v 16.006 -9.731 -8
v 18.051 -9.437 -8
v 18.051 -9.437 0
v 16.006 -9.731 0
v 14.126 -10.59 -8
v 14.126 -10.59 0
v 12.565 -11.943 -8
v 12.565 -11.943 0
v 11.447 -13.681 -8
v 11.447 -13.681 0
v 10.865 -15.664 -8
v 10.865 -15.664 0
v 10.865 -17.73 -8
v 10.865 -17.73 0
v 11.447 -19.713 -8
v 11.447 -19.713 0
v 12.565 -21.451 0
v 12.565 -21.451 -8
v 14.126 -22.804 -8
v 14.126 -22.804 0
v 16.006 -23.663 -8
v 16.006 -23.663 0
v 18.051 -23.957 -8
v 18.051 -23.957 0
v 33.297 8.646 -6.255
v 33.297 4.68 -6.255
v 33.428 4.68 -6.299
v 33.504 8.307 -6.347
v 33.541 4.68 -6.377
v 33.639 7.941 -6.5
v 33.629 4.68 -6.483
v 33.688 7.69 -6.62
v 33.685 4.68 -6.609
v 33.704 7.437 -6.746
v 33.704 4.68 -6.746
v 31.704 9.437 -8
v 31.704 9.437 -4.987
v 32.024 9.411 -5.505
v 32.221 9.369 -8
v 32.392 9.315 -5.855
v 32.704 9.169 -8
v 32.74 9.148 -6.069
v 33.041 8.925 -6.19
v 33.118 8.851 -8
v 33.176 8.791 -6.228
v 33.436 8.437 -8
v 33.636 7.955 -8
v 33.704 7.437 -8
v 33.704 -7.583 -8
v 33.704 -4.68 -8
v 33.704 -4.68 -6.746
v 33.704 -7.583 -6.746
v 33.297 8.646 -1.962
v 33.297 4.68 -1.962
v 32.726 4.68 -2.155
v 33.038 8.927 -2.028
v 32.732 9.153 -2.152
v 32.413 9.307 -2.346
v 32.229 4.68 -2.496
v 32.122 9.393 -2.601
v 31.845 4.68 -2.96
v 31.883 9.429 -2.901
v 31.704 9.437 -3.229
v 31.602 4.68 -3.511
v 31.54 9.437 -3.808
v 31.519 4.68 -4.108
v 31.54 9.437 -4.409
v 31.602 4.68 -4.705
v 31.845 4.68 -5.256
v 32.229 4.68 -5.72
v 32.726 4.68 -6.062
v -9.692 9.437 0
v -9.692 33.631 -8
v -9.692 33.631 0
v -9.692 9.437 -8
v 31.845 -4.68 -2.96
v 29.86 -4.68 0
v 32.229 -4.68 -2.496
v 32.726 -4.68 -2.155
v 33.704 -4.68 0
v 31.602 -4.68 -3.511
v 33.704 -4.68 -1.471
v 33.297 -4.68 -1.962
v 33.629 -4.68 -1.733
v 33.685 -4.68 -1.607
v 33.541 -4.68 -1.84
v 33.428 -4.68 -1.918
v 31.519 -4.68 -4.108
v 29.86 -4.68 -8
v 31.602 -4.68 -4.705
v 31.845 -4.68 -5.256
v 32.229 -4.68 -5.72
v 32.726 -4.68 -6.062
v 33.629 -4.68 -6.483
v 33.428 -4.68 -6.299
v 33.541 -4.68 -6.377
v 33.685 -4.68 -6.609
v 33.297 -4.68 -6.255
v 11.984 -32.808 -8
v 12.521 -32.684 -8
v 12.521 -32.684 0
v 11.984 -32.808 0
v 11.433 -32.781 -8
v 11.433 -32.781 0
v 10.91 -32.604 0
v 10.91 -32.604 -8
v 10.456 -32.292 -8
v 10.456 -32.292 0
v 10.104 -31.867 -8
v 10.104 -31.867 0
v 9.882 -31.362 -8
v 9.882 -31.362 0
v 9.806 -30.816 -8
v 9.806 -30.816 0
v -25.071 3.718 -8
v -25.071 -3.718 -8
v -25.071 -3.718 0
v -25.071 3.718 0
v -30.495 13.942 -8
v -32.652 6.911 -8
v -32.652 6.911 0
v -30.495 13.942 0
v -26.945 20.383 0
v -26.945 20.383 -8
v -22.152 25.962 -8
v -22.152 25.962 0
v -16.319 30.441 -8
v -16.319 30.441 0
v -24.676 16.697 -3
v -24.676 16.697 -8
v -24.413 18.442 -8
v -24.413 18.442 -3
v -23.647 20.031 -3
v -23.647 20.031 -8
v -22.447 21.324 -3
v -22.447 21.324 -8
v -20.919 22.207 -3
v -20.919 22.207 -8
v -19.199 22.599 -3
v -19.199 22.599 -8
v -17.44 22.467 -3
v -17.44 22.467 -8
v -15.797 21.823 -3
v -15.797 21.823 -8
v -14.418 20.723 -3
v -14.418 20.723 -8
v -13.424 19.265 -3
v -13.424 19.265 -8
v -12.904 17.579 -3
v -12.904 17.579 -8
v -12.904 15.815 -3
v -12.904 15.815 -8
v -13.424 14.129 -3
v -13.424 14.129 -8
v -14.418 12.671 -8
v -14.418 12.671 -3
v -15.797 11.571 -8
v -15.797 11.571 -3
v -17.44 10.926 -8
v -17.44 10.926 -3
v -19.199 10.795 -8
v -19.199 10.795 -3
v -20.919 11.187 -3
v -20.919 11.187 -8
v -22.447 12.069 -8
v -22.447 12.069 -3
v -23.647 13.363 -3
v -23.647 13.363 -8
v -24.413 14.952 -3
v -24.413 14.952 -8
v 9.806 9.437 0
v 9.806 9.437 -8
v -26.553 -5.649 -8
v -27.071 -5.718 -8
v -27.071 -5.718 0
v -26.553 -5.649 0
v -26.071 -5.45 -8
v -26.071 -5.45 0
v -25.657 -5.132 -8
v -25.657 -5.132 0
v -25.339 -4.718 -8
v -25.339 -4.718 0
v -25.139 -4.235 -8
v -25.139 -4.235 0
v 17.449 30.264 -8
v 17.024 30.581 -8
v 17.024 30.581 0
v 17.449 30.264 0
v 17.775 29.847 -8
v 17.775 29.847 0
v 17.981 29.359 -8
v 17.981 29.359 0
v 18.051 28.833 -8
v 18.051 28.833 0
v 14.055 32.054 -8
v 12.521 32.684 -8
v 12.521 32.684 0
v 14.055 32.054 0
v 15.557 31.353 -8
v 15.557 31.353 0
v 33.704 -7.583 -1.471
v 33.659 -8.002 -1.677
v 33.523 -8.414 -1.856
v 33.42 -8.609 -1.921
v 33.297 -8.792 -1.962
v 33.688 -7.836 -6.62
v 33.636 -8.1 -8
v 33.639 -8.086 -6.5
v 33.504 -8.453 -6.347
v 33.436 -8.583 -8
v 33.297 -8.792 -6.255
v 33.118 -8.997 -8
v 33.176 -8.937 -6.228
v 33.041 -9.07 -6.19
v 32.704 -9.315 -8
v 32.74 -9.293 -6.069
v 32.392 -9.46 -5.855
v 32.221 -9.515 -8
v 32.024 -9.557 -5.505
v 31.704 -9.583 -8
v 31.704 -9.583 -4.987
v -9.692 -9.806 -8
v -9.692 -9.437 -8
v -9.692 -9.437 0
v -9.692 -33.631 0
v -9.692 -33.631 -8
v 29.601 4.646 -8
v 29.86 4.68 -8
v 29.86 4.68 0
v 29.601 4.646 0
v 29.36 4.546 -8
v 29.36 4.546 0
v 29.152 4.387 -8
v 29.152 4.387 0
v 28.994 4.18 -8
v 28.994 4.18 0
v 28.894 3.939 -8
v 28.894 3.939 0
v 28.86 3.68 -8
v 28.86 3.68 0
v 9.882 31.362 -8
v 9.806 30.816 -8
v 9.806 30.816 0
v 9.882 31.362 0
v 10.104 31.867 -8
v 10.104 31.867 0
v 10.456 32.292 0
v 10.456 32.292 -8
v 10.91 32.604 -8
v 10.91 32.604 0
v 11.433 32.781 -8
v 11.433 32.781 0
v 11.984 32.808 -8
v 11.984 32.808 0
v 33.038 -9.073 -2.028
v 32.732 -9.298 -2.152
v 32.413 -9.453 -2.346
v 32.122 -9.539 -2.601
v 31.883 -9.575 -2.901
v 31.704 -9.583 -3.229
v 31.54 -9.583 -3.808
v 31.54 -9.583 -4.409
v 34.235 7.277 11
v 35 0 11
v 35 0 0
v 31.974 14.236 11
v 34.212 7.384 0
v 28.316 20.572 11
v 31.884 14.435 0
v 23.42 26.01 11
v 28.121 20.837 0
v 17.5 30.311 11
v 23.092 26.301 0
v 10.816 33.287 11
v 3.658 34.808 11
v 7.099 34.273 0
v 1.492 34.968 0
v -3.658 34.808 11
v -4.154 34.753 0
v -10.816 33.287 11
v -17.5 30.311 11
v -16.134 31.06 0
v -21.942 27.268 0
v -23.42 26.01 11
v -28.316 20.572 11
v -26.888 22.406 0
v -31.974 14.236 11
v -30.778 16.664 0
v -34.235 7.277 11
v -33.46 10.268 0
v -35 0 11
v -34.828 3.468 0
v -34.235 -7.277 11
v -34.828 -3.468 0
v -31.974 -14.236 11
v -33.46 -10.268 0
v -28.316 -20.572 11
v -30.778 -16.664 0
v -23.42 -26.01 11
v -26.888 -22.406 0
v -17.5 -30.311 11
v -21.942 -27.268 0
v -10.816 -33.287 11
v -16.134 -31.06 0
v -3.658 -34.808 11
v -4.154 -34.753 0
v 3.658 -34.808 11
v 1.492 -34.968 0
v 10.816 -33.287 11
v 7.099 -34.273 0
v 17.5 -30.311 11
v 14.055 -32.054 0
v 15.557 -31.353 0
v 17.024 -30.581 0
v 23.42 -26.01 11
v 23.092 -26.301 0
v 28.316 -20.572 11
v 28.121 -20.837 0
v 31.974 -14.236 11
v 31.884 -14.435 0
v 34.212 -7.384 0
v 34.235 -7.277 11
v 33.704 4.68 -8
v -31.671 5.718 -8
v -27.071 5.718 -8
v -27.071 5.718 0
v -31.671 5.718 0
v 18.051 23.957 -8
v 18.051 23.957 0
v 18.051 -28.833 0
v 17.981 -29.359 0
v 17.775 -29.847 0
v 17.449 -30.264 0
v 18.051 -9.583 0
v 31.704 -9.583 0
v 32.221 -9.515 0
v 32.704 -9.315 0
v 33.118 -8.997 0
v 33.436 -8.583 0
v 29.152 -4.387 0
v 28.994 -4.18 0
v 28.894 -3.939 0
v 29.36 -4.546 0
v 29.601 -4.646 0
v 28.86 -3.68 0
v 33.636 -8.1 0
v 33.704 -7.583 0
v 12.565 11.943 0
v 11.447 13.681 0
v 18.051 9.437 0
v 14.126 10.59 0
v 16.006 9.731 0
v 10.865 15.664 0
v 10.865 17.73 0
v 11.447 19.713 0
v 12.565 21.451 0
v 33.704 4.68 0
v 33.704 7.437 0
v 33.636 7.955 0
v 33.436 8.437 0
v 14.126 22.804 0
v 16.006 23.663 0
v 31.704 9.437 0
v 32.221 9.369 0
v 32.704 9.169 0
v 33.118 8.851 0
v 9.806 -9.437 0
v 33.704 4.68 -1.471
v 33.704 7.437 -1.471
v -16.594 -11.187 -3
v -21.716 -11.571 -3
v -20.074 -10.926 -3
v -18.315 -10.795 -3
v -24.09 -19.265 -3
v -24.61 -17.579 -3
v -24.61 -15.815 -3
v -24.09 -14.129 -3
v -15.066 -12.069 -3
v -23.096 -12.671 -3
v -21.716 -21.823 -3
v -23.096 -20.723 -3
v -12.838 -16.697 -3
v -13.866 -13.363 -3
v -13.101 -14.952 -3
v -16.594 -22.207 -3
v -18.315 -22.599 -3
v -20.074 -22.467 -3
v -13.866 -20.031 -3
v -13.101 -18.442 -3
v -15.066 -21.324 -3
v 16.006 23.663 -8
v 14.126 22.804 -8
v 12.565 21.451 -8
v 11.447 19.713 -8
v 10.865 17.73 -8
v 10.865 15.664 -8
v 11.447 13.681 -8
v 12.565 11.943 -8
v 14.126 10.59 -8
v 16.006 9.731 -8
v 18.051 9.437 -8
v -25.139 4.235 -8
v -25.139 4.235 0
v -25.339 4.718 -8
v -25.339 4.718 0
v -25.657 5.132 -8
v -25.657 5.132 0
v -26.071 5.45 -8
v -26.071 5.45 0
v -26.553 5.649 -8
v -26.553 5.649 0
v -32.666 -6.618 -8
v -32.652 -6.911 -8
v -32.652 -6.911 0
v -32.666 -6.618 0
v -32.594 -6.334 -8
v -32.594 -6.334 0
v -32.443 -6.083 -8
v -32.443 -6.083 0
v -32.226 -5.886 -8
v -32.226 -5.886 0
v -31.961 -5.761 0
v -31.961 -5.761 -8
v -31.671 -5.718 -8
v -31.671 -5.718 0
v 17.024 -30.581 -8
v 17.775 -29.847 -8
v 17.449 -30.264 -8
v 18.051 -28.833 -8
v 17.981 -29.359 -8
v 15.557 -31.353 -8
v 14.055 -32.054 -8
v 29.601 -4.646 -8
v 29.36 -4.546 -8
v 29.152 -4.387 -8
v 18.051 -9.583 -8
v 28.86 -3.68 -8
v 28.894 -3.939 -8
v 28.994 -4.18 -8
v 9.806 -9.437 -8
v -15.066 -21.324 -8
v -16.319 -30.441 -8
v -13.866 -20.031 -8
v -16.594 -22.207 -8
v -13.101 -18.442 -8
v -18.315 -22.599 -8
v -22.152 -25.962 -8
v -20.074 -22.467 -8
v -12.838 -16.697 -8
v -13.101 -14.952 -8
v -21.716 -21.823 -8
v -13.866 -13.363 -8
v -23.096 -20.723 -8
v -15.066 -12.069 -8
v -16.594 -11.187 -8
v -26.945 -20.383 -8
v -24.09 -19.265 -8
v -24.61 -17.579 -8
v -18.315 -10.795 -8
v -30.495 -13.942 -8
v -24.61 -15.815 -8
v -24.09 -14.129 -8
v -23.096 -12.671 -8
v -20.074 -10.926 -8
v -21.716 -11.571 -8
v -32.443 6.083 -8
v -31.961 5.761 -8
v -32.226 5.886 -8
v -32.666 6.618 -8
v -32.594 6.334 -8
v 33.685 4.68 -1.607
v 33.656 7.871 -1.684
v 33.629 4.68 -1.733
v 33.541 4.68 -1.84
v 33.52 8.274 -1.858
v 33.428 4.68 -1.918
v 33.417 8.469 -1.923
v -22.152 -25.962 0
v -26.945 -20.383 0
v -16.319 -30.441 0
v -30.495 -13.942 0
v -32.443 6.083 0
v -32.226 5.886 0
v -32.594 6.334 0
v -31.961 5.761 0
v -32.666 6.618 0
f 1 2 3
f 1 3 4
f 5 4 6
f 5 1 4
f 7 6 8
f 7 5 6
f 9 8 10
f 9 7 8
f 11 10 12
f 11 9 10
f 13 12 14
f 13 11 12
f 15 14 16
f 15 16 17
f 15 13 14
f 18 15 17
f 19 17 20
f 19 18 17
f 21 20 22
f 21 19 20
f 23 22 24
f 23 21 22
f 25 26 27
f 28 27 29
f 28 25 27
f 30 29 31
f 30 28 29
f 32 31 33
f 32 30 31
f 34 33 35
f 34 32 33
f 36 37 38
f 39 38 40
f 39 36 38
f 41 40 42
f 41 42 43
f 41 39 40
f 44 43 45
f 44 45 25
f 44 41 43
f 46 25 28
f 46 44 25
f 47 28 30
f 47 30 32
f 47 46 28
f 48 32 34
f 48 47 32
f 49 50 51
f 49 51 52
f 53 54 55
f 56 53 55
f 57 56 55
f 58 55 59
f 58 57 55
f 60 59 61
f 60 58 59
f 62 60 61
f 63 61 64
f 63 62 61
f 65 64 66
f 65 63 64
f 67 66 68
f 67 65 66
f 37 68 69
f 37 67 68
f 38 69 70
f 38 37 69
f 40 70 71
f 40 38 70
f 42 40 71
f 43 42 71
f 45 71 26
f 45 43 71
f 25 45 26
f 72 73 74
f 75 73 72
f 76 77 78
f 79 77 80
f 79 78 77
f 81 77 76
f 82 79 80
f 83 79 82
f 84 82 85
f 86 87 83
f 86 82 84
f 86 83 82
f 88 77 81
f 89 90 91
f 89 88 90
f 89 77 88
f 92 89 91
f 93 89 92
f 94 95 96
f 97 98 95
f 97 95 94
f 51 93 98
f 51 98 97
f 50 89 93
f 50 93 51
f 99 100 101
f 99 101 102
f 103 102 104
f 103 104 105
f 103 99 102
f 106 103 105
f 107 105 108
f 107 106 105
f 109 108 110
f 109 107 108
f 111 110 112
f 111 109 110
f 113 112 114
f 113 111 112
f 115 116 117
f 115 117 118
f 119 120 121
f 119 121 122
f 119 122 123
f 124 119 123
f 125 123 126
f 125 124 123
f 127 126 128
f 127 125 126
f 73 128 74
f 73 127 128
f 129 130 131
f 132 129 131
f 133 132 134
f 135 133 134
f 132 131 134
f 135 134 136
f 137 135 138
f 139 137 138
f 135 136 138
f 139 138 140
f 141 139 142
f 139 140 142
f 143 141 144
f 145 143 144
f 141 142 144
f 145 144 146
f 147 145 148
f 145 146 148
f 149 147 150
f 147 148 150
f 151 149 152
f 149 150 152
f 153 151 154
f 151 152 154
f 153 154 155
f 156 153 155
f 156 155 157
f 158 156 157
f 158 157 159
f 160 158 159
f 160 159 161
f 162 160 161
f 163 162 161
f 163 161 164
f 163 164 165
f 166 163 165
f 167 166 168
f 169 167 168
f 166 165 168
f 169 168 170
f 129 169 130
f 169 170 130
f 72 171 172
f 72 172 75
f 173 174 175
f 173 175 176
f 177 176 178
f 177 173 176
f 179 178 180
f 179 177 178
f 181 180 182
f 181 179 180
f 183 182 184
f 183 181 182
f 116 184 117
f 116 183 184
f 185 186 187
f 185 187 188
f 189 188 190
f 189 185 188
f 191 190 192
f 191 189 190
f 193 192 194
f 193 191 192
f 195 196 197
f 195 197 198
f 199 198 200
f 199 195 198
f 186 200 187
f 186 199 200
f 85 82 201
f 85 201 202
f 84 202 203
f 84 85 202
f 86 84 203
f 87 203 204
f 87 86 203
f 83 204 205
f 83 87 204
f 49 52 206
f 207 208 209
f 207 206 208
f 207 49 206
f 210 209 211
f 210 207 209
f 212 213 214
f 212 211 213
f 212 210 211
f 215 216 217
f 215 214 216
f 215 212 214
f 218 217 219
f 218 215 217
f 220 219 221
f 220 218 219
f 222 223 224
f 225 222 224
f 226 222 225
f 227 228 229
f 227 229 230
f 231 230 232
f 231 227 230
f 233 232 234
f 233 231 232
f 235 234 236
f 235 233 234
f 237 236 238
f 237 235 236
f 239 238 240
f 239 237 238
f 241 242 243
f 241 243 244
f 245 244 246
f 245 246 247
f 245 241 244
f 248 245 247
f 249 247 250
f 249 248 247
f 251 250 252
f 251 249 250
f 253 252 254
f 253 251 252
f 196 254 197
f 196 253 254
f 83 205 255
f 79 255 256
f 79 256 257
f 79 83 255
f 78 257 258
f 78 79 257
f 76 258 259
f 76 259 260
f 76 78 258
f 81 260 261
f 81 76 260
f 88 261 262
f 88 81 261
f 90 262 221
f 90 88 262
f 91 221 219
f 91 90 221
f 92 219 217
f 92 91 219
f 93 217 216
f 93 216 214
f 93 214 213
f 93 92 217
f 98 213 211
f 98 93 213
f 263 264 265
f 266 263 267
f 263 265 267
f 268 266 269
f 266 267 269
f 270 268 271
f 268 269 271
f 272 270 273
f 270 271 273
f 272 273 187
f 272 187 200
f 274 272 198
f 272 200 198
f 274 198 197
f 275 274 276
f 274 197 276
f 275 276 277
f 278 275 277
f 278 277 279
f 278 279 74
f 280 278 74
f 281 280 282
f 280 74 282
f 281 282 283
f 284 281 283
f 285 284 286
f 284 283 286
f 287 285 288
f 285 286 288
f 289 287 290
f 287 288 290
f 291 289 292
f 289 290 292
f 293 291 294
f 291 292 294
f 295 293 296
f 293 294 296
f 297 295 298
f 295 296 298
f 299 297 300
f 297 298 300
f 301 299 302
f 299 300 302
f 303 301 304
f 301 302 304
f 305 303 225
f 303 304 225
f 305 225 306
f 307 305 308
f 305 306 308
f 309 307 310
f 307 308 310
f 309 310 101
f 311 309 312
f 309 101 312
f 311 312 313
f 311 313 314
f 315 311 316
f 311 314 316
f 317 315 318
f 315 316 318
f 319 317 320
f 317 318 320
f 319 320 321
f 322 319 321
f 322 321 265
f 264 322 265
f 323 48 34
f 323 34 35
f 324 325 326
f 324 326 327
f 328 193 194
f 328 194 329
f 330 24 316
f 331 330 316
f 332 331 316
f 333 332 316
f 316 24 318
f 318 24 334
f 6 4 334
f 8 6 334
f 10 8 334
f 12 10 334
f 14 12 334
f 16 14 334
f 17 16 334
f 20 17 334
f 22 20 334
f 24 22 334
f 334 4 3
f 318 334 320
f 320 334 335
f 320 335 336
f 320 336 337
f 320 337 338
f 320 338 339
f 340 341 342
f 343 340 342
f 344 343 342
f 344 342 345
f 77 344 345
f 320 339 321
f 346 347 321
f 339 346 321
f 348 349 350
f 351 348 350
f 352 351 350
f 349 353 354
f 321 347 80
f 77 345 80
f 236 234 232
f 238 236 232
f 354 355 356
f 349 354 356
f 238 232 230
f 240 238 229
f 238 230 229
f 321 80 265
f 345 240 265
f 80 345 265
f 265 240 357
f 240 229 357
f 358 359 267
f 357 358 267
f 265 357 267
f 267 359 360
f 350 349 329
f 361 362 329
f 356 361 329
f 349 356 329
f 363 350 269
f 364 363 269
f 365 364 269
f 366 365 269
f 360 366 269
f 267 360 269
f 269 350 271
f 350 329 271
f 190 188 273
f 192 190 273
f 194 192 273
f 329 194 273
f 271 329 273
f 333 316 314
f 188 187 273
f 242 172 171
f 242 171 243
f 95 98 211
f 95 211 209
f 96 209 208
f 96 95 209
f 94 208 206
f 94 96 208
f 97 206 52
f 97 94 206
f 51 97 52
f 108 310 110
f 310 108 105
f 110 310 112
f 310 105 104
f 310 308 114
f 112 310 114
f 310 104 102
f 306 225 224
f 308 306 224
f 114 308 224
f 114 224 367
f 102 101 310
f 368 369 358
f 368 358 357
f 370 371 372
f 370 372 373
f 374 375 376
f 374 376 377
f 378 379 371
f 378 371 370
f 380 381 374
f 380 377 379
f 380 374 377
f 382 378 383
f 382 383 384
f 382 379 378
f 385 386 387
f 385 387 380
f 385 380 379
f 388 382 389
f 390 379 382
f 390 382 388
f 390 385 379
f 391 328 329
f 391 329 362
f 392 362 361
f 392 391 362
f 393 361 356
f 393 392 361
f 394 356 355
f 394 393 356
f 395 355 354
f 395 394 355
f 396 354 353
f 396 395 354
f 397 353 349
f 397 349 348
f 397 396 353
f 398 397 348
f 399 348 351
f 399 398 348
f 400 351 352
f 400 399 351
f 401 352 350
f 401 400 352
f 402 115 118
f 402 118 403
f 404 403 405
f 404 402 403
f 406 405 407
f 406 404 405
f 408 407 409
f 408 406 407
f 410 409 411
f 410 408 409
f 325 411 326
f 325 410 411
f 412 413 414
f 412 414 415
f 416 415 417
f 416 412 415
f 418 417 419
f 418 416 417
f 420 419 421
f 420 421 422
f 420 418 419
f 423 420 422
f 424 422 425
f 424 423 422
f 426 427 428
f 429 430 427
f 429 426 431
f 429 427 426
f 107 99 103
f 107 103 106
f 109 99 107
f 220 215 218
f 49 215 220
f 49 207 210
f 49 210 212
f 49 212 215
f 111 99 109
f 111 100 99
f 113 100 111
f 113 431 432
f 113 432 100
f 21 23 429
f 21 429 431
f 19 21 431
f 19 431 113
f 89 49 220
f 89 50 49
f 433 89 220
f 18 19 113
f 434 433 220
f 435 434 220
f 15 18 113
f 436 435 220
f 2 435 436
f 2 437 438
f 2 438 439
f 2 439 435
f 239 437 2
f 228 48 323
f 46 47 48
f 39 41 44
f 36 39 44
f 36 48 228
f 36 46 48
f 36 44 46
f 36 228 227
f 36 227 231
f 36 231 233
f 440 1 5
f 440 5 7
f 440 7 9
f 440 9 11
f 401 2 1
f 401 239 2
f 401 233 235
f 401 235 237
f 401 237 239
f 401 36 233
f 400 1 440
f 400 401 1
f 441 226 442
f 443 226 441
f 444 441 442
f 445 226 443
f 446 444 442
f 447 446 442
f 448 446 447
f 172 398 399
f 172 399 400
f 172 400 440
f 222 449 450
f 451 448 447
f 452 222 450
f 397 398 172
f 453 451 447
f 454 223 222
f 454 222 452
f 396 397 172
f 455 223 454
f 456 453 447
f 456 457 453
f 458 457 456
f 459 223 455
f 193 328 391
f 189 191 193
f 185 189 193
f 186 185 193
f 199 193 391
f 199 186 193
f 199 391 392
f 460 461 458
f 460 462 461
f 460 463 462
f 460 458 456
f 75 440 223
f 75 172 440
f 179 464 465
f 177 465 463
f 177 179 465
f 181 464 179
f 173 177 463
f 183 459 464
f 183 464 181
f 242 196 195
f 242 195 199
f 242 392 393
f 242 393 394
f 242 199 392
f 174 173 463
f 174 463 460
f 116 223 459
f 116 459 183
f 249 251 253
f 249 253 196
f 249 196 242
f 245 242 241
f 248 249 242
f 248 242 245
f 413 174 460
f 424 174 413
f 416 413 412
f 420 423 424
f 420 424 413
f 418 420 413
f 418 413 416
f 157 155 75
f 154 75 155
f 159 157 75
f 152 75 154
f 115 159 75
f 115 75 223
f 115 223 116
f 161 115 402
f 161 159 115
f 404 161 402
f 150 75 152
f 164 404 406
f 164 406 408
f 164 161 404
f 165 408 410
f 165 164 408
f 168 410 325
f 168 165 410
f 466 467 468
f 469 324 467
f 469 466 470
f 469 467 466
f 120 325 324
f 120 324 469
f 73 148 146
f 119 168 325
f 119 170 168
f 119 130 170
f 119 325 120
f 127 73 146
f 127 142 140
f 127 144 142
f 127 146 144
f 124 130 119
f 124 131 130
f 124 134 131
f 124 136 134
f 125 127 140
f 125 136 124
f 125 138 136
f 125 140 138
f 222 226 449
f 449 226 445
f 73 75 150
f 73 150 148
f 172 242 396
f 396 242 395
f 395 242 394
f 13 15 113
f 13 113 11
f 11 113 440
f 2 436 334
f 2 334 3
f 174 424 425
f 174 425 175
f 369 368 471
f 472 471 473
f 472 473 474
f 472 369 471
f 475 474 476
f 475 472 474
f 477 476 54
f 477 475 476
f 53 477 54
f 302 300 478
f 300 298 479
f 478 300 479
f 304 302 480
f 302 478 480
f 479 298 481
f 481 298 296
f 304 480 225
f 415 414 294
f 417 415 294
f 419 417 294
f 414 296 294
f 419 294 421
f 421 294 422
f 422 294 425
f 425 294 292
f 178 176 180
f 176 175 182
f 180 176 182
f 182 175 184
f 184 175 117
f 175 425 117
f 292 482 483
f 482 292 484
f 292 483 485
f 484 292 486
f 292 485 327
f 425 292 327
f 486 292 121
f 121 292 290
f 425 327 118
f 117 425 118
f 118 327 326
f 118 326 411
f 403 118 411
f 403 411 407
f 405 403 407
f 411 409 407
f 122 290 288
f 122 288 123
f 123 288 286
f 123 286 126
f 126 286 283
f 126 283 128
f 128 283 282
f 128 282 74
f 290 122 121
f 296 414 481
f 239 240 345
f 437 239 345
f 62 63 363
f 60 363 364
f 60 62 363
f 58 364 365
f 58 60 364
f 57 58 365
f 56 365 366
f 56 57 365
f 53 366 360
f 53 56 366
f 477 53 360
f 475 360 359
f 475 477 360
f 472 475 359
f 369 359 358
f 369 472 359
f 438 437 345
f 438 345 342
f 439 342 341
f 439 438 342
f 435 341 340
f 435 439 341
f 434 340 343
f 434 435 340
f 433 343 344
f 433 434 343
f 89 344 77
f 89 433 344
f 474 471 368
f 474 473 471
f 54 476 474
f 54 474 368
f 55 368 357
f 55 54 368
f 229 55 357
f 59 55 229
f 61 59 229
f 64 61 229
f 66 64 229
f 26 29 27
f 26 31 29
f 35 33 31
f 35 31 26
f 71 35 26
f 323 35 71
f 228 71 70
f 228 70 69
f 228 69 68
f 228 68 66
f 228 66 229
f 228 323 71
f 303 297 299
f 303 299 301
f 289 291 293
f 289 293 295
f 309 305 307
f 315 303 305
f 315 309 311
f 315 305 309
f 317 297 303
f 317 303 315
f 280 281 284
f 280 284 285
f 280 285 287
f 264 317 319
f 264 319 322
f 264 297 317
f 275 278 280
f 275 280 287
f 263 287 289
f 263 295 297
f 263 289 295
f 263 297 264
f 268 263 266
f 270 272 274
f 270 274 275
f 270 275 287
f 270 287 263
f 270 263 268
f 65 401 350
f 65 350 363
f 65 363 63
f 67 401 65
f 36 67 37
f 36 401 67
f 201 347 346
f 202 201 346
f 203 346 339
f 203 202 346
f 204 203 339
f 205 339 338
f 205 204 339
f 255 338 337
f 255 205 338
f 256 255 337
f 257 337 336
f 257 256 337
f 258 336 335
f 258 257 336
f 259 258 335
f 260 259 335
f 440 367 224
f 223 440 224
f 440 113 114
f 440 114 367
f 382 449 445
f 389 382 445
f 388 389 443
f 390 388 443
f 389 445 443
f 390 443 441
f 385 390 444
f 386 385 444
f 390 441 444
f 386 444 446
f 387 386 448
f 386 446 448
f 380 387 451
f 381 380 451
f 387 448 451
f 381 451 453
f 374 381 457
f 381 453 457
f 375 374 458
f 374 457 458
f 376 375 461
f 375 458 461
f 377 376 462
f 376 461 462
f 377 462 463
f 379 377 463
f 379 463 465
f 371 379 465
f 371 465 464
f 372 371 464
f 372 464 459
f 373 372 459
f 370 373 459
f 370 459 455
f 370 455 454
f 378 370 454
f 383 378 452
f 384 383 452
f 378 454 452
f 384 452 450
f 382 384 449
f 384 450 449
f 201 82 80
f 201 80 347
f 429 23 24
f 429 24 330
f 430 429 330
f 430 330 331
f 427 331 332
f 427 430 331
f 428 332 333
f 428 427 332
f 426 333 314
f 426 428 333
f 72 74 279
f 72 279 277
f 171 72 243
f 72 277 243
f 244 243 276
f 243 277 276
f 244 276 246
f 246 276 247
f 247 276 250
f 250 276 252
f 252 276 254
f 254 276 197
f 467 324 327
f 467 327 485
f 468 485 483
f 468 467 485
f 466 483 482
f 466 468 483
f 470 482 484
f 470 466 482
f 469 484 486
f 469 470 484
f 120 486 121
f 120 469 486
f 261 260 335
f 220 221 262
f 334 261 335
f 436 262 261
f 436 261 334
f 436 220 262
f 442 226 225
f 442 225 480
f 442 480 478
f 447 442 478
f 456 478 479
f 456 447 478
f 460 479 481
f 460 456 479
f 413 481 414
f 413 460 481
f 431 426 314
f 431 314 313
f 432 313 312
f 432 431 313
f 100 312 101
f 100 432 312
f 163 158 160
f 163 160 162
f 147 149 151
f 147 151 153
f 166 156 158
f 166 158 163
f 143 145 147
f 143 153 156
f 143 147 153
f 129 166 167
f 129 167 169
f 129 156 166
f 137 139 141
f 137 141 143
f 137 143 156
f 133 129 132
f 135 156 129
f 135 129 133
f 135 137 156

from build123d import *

# Parameters (mm, degrees)
SKETCH1_R               = 35
BOSS_EXTRUDE1_DEPTH     = 11
BOSS_EXTRUDE2_START     = 8
SKETCH2_W               = 9.919125271
SKETCH2_H               = 19.24261003
BOSS_EXTRUDE2_DEPTH     = 8
SKETCH4_W               = 19.49756264
SKETCH4_H               = 18.874094786
BOSS_EXTRUDE3_DEPTH     = 8
SKETCH6_R               = 5.918890508
CUT_EXTRUDE1_DEPTH      = 5
CUT_EXTRUDE4_DEPTH      = 16
CUT_EXTRUDE4_DEPTH_BACK = 5


with BuildPart() as part:
    # Sketch1 → Boss-Extrude1 (new body)
    with BuildSketch(Plane.XY):
        Circle(SKETCH1_R)
    extrude(amount=BOSS_EXTRUDE1_DEPTH)

    # Sketch2 → Boss-Extrude2 (add)
    with BuildSketch(Plane(origin=(0, 0, 0), x_dir=(-1, 0, 0), z_dir=(0, 0, -1)).offset(BOSS_EXTRUDE2_START)):
        with BuildLine():
            Line((-18.0511494, 9.437047393), (-31.70374069, 9.437047393))
            ThreePointArc((-31.70374069, 9.437047393), (-33.117954252, 8.851260956), (-33.70374069, 7.437047393))
            Line((-33.70374069, 7.437047393), (-33.70374069, 4.679927622))
            Line((-33.70374069, 4.679927622), (-29.859553671, 4.679927622))
            ThreePointArc((-29.859553671, 4.679927622), (-29.15244689, 4.387034403), (-28.859553671, 3.679927622))
            Line((-28.859553671, 3.679927622), (-28.859553671, 0))
            Line((-28.859553671, 0), (-28.859553671, -3.679927622))
            ThreePointArc((-28.859553671, -3.679927622), (-29.15244689, -4.387034403), (-29.859553671, -4.679927622))
            Line((-29.859553671, -4.679927622), (-33.70374069, -4.679927622))
            Line((-33.70374069, -4.679927622), (-33.70374069, -7.582708941))
            ThreePointArc((-33.70374069, -7.582708941), (-33.117954252, -8.996922503), (-31.70374069, -9.582708941))
            Line((-31.70374069, -9.582708941), (-18.0511494, -9.582708941))
            Line((-18.0511494, -9.582708941), (-18.0511494, -9.437047393))
            ThreePointArc((-18.0511494, -9.437047393), (-10.791286921, -16.696909873), (-18.0511494, -23.956772352))
            Line((-18.0511494, -23.956772352), (-18.0511494, -28.833324521))
            ThreePointArc((-18.0511494, -28.833324521), (-17.775329476, -29.846834791), (-17.023946334, -30.580798734))
            ThreePointArc((-17.023946334, -30.580798734), (-14.809870149, -31.712264917), (-12.521051282, -32.683685147))
            ThreePointArc((-12.521051282, -32.683685147), (-10.672199785, -32.463919973), (-9.805562637, -30.816045996))
            Line((-9.805562637, -30.816045996), (-9.805562637, 9.437047393))
            Line((-9.805562637, 9.437047393), (-9.805562637, 30.816045996))
            ThreePointArc((-9.805562637, 30.816045996), (-10.672199785, 32.463919973), (-12.521051282, 32.683685147))
            ThreePointArc((-12.521051282, 32.683685147), (-14.809870149, 31.712264917), (-17.023946334, 30.580798734))
            ThreePointArc((-17.023946334, 30.580798734), (-17.775329476, 29.84683479), (-18.0511494, 28.833324521))
            Line((-18.0511494, 28.833324521), (-18.0511494, 23.956772352))
            ThreePointArc((-18.0511494, 23.956772352), (-10.791286921, 16.696909873), (-18.0511494, 9.437047393))
        make_face()
        with BuildLine():
            ThreePointArc((32.652182779, 6.91093898), (24.692534845, 23.296158989), (9.692000003, 33.631311838))
            Line((9.692000003, 33.631311838), (9.692000003, 9.437047393))
            Line((9.692000003, 9.437047393), (19.611125274, 9.437047393))
            Line((19.611125274, 9.437047393), (19.611125274, -9.805562637))
            Line((19.611125274, -9.805562637), (9.692000003, -9.805562637))
            Line((9.692000003, -9.805562637), (9.692000003, -33.631311838))
            ThreePointArc((9.692000003, -33.631311838), (24.692534845, -23.296158989), (32.652182779, -6.91093898))
            ThreePointArc((32.652182779, -6.91093898), (32.443493864, -6.082517787), (31.671050481, -5.717601419))
            Line((31.671050481, -5.717601419), (27.071040834, -5.717601419))
            ThreePointArc((27.071040834, -5.717601419), (25.656827271, -5.131814981), (25.071040834, -3.717601419))
            Line((25.071040834, -3.717601419), (25.071040834, 3.717601419))
            ThreePointArc((25.071040834, 3.717601419), (25.656827271, 5.131814981), (27.071040834, 5.717601419))
            Line((27.071040834, 5.717601419), (31.671050481, 5.717601419))
            ThreePointArc((31.671050481, 5.717601419), (32.443493864, 6.082517787), (32.652182779, 6.91093898))
        make_face()
        with Locations((14.651562639, -0.184257622)):
            Rectangle(SKETCH2_W, SKETCH2_H)
    extrude(amount=-BOSS_EXTRUDE2_DEPTH)

    # Sketch4 → Boss-Extrude3 (add)
    with BuildSketch(Plane(origin=(0, 0, 0), x_dir=(-1, 0, 0), z_dir=(0, 0, -1))):
        with Locations((-0.056781317, 0)):
            Rectangle(SKETCH4_W, SKETCH4_H)
    extrude(amount=BOSS_EXTRUDE3_DEPTH)

    # Sketch6 → Cut-Extrude1 (cut)
    with BuildSketch(Plane(origin=(0, 0, -8), x_dir=(-1, 0, 0), z_dir=(0, 0, -1))):
        with Locations((18.756852772, 16.696909873)):
            Circle(SKETCH6_R)
        with Locations(Location((18.756852772, -16.696909873, 0), (0, 0, 180))):
            Circle(SKETCH6_R)
    extrude(amount=-CUT_EXTRUDE1_DEPTH, mode=Mode.SUBTRACT)

    # Sketch11 → Cut-Extrude4 (cut, two sides: drawn at the far end of the back side and taken through both)
    with BuildSketch(Plane(origin=(0, 4.679927622, 0), x_dir=(-1, 0, 0), z_dir=(0, -1, 0)).offset(-CUT_EXTRUDE4_DEPTH_BACK)):
        with BuildLine():
            Line((-33.70374069, 6.745944891), (-33.70374069, 1.4705717))
            ThreePointArc((-33.70374069, 1.4705717), (-33.58881267, 1.789506757), (-33.296862408, 1.961823515))
            ThreePointArc((-33.296862408, 1.961823515), (-31.519082318, 4.108258295), (-33.296862408, 6.254693076))
            ThreePointArc((-33.296862408, 6.254693076), (-33.58881267, 6.427009834), (-33.70374069, 6.745944891))
        make_face()
    extrude(amount=CUT_EXTRUDE4_DEPTH + CUT_EXTRUDE4_DEPTH_BACK, mode=Mode.SUBTRACT)


solid = part.part
